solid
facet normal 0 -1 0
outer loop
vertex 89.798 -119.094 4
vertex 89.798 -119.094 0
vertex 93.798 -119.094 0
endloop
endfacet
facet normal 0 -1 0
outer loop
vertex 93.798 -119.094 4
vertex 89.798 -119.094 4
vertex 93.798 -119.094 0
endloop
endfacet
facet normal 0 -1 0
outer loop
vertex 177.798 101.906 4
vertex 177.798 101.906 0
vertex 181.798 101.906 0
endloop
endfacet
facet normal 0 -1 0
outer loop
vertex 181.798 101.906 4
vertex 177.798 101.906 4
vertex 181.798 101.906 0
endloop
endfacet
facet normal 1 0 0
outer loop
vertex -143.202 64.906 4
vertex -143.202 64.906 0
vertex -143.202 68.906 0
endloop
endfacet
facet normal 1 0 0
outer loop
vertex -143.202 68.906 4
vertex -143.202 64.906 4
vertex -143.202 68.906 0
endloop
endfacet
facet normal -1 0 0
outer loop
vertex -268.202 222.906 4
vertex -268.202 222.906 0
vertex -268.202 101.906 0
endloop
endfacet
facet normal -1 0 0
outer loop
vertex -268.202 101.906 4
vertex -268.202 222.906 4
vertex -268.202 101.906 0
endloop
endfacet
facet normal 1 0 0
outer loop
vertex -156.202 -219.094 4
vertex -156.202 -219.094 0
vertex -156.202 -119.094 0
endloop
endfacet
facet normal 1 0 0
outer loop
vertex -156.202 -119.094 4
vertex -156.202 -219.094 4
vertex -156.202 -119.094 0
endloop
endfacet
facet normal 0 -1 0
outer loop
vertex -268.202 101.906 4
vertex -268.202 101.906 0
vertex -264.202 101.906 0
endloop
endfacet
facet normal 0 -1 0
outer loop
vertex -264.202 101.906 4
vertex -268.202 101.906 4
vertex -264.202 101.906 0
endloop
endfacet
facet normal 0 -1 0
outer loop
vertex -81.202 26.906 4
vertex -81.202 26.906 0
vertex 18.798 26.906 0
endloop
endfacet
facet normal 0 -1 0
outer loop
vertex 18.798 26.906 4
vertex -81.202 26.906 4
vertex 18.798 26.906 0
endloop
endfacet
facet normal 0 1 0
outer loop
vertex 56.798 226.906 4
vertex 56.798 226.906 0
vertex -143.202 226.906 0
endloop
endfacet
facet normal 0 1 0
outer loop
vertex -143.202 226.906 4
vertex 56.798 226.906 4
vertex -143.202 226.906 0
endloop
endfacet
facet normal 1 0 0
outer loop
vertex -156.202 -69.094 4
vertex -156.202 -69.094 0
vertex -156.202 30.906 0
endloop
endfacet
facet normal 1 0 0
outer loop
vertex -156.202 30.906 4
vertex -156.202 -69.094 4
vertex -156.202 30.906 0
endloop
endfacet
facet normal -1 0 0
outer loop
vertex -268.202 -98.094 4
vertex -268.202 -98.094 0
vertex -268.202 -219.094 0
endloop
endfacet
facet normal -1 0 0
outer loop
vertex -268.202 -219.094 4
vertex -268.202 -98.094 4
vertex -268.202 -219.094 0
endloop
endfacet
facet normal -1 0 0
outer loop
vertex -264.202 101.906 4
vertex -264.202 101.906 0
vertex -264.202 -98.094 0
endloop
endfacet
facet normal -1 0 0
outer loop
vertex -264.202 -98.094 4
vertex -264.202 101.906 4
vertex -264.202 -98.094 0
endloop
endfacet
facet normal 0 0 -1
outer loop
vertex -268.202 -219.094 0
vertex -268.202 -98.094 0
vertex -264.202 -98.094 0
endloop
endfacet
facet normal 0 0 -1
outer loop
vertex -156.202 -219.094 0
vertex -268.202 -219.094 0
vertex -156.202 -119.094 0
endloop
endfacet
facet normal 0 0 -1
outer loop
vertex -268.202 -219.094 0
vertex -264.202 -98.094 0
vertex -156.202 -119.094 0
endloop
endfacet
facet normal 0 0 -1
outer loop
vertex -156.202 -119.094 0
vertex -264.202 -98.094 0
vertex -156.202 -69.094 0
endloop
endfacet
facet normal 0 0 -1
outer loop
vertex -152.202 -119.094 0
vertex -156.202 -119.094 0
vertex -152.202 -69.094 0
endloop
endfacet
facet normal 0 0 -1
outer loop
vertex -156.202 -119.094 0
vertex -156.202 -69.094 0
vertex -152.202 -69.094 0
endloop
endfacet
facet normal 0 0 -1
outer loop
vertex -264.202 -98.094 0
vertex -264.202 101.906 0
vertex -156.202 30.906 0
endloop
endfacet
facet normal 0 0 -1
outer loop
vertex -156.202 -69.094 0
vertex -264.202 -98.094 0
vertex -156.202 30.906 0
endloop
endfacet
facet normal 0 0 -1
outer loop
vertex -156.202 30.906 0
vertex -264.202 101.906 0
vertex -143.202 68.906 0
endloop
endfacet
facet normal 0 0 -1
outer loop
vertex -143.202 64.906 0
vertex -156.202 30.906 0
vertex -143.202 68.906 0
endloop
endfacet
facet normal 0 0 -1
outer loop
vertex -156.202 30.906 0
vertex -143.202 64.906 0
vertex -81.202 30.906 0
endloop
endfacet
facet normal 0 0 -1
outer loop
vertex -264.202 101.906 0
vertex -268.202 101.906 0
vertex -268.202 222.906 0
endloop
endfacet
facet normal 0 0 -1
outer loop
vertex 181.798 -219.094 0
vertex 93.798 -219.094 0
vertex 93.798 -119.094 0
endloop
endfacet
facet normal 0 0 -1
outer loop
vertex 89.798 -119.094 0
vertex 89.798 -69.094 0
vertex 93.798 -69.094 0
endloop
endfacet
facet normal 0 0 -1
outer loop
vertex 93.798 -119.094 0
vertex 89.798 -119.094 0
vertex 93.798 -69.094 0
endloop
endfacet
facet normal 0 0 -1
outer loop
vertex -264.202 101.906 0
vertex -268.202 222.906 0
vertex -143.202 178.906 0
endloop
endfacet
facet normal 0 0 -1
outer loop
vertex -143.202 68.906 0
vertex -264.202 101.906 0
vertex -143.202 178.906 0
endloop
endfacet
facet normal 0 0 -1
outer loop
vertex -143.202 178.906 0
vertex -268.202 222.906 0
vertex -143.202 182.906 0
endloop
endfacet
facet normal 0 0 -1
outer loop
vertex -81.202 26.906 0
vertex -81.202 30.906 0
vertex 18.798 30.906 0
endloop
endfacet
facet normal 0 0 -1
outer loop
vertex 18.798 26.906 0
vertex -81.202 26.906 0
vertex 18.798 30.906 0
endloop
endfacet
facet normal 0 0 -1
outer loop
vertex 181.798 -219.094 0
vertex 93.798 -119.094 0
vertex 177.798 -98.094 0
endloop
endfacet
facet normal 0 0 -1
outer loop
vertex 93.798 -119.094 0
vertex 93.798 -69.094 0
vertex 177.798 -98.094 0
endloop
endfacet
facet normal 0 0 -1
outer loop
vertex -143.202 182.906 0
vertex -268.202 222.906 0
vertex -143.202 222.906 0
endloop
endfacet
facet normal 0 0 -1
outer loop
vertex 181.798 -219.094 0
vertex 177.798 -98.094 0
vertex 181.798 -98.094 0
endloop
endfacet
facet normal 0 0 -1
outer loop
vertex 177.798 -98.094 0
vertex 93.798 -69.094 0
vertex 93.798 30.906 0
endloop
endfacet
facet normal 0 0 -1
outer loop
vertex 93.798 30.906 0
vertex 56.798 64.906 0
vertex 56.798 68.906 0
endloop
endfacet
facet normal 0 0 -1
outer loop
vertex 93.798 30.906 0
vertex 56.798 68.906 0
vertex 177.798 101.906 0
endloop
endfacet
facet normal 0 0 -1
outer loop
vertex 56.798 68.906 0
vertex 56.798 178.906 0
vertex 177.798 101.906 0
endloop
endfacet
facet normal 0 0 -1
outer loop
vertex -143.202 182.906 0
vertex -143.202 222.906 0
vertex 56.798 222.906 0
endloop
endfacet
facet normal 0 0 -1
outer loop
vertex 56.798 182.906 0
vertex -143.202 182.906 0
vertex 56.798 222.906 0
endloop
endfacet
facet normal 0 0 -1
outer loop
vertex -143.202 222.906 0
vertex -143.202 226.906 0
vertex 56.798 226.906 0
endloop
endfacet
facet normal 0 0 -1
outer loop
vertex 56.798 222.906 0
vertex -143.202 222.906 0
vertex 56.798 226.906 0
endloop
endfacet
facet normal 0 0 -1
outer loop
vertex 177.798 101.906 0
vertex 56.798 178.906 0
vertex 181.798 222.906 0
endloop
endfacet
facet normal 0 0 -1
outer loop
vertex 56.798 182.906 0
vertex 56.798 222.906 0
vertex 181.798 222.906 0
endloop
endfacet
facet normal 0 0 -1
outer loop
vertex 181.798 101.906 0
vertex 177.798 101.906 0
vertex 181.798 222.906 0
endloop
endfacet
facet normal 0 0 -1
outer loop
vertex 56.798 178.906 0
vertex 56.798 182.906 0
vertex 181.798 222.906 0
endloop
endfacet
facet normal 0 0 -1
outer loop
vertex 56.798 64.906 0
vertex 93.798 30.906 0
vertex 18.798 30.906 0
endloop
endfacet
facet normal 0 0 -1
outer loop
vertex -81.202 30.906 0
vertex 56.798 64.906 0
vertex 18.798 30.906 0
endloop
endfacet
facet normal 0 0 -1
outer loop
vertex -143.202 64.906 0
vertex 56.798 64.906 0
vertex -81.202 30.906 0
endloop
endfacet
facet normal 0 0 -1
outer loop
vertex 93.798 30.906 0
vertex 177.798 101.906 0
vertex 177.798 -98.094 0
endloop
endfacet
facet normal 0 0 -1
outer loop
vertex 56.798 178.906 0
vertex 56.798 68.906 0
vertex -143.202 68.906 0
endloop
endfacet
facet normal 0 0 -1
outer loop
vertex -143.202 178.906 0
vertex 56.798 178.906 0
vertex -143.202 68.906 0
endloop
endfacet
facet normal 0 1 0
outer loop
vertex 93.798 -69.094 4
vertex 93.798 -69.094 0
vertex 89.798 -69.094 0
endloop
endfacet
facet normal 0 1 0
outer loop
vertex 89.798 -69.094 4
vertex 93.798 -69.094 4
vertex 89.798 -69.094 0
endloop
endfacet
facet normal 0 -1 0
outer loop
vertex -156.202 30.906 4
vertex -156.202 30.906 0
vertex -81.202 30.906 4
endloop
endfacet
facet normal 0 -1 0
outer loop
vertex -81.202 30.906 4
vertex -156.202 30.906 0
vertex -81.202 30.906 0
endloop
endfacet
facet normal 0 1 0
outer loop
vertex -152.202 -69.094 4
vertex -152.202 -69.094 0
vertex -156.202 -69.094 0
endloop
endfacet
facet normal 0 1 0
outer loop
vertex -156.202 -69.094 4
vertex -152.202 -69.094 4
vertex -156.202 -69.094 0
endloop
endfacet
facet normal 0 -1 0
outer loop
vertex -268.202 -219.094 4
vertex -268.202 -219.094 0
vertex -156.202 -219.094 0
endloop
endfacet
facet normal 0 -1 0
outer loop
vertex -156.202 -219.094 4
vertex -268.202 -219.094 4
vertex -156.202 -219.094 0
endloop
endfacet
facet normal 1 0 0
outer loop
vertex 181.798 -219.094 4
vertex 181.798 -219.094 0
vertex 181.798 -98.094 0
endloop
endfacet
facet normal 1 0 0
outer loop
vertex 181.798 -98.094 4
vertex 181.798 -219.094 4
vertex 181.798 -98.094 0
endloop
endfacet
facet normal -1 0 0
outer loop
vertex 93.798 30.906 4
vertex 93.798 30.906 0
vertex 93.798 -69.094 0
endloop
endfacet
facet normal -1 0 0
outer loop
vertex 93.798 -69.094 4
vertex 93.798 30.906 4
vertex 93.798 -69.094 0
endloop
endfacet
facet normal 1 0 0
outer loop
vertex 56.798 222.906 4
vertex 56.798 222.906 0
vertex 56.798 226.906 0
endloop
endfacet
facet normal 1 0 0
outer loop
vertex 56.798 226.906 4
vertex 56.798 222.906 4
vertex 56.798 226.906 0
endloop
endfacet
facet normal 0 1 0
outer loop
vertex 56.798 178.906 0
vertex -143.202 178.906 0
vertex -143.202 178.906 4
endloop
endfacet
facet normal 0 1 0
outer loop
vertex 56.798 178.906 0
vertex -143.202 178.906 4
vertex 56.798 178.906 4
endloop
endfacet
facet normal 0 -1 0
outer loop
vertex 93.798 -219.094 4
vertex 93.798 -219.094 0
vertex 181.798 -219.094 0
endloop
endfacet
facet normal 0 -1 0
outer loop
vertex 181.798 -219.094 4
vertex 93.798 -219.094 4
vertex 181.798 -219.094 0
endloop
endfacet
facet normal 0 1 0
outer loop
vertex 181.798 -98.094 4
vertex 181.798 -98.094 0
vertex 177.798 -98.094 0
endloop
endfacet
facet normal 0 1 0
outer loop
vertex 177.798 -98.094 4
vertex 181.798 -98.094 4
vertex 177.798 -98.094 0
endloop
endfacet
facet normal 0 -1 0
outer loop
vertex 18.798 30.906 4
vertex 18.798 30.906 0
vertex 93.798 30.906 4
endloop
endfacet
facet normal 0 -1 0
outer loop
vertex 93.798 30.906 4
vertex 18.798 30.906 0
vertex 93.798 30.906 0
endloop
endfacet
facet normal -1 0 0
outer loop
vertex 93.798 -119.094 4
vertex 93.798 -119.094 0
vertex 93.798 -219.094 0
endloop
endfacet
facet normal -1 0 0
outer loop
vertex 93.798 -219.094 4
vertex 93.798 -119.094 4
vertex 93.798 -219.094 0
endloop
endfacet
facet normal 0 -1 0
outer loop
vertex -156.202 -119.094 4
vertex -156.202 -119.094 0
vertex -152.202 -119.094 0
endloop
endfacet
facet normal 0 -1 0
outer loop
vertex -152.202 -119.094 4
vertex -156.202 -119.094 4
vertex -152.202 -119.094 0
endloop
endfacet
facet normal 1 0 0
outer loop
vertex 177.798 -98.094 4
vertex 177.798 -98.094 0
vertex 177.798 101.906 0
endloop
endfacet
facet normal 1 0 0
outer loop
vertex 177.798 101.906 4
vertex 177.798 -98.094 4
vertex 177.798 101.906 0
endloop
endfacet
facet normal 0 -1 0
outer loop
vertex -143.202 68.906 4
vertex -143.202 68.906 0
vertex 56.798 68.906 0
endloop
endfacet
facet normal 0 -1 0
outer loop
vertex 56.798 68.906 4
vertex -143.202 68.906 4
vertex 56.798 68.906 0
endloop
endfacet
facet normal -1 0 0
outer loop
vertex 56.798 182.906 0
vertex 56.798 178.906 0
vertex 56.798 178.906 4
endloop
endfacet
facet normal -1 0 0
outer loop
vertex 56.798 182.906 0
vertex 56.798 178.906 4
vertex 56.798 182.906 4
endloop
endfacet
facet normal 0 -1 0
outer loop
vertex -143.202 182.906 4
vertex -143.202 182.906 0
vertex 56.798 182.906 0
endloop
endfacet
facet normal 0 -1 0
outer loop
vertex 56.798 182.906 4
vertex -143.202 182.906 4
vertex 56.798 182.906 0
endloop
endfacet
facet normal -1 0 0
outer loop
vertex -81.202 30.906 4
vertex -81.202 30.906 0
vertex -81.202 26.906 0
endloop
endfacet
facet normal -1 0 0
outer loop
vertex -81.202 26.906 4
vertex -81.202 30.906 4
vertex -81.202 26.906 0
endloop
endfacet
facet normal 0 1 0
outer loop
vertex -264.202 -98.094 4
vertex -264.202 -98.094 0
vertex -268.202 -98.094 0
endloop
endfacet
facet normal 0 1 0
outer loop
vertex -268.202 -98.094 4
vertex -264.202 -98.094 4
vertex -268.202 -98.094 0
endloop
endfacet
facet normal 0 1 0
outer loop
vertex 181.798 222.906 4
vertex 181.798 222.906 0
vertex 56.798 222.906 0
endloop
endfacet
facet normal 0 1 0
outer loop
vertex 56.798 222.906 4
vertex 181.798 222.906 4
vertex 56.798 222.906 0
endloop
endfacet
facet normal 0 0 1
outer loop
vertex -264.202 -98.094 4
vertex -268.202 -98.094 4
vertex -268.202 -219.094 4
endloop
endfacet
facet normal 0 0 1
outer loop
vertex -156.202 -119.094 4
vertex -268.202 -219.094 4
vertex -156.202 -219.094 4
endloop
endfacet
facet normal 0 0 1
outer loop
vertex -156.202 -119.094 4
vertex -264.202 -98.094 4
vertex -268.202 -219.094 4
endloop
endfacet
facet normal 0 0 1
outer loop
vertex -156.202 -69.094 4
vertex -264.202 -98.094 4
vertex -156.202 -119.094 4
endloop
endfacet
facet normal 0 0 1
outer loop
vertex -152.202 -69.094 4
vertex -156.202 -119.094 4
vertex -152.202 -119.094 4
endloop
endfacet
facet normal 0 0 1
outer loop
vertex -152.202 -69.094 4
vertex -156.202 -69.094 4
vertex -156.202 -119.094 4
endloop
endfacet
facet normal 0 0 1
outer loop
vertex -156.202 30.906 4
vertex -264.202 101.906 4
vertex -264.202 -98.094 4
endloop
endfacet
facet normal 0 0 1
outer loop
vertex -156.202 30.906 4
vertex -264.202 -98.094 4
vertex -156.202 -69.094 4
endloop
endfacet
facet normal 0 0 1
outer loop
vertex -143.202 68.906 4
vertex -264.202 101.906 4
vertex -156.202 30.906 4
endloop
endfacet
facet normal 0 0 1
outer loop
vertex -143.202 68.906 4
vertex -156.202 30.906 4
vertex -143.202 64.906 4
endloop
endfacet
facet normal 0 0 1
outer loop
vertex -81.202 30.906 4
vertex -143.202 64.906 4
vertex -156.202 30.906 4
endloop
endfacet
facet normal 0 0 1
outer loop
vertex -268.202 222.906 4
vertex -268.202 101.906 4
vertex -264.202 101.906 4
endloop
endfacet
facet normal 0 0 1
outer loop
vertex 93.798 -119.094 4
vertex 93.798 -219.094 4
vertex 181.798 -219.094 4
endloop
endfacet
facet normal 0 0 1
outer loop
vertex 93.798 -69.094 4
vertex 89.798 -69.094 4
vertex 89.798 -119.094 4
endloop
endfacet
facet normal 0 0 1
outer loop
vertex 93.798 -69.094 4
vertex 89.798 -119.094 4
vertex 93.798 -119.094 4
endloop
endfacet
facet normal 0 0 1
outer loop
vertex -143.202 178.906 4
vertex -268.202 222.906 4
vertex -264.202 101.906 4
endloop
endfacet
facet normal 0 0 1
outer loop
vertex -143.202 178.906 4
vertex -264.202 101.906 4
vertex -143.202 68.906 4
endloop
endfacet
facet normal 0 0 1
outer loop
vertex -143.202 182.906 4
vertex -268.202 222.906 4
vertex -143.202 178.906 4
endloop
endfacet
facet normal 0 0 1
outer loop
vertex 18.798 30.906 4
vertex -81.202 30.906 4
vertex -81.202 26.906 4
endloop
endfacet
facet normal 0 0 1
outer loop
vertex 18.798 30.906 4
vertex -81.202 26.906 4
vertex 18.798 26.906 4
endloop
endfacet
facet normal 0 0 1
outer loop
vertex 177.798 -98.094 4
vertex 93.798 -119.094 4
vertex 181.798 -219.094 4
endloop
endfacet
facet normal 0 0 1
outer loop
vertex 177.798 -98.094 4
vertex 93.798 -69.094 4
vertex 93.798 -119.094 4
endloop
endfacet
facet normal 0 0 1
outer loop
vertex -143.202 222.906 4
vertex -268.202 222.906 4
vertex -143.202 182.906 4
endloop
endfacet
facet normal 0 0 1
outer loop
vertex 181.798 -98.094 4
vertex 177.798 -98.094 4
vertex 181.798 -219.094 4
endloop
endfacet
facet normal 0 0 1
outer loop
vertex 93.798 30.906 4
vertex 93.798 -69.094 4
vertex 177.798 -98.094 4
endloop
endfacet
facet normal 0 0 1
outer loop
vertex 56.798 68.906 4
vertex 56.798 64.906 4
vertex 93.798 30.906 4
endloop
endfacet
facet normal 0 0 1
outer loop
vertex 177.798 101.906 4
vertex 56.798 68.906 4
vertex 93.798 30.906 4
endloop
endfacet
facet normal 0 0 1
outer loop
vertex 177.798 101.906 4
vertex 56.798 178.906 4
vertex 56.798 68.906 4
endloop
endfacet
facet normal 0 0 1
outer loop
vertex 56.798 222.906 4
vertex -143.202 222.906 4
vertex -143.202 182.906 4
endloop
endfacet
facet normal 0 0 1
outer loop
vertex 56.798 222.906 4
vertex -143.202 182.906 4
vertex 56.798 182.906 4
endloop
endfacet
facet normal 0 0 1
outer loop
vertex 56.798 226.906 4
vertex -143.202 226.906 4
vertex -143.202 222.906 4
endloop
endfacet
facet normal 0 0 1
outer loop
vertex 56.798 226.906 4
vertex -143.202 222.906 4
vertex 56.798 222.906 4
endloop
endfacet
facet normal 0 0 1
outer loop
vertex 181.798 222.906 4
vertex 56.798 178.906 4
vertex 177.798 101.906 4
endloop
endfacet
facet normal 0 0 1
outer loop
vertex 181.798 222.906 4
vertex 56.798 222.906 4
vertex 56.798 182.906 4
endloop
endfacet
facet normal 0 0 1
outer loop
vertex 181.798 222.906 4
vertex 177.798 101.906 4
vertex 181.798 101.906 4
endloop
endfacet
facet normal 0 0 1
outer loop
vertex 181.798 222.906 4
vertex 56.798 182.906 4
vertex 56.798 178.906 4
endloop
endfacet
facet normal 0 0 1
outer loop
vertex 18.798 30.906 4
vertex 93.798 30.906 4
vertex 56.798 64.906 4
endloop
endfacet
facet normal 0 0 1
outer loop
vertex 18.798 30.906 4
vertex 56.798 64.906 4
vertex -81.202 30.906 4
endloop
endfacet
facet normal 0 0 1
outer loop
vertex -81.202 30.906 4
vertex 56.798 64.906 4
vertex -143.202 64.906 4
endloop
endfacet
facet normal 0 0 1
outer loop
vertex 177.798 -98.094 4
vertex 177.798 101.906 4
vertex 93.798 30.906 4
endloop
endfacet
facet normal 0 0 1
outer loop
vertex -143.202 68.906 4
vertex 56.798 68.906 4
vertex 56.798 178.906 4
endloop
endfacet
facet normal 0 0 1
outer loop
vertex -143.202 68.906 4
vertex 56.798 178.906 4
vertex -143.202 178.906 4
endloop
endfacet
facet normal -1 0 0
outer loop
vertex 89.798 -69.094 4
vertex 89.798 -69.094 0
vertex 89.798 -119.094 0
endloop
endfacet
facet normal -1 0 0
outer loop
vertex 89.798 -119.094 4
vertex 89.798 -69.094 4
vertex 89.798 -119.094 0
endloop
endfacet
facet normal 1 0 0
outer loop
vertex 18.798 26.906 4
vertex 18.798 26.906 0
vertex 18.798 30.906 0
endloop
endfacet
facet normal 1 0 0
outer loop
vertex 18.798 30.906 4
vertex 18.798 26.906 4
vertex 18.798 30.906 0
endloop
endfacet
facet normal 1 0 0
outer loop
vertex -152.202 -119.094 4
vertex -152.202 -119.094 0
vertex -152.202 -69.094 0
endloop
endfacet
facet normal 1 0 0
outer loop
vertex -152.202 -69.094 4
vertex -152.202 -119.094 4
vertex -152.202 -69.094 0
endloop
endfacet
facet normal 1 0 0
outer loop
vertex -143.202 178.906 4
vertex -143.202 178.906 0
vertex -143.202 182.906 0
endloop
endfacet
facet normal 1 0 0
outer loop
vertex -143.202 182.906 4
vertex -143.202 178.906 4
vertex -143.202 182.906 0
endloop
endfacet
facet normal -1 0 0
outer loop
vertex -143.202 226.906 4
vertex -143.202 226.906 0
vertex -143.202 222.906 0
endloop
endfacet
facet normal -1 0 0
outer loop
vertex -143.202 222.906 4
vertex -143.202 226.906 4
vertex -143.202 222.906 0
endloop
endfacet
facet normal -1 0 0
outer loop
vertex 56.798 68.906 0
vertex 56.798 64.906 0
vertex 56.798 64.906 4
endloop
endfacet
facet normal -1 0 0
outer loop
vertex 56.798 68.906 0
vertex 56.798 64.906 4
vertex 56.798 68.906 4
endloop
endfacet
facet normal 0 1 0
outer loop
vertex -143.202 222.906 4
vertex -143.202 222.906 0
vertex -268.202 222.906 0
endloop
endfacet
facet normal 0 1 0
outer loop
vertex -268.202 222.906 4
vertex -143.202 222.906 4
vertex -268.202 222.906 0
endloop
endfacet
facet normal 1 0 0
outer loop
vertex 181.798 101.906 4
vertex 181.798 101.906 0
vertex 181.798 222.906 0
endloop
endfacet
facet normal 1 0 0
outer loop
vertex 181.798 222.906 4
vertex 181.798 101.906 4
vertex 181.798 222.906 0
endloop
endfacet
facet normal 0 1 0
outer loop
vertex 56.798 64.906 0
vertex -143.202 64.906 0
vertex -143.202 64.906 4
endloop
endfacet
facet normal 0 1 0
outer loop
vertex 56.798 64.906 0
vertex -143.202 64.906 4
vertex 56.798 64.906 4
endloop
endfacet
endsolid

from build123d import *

# Parameters (mm, degrees)
SKETCH1_W           = 200
SKETCH1_H           = 4
BOSS_EXTRUDE1_DEPTH = 4


with BuildPart() as part:
    # Sketch1 → Boss-Extrude1 (new body)
    with BuildSketch(Plane.XY):
        Polygon((-268.2019237, -98.094032778), (-268.2019237, -219.094032778), (-156.2019237, -219.094032778), (-156.2019237, -119.094032778), (-152.2019237, -119.094032778), (-152.2019237, -69.094032778), (-156.2019237, -69.094032778), (-156.2019237, 30.905967222), (-81.2019237, 30.905967222), (-81.2019237, 26.905967222), (18.7980763, 26.905967222), (18.7980763, 30.905967222), (93.7980763, 30.905967222), (93.7980763, -69.094032778), (89.7980763, -69.094032778), (89.7980763, -119.094032778), (93.7980763, -119.094032778), (93.7980763, -219.094032778), (181.7980763, -219.094032778), (181.7980763, -98.094032778), (177.7980763, -98.094032778), (177.7980763, 101.905967222), (181.7980763, 101.905967222), (181.7980763, 222.905967222), (56.7980763, 222.905967222), (56.7980763, 226.905967222), (-143.2019237, 226.905967222), (-143.2019237, 222.905967222), (-268.2019237, 222.905967222), (-268.2019237, 101.905967222), (-264.2019237, 101.905967222), (-264.2019237, -98.094032778), align=None)
        with Locations((-43.2019237, 66.905967222)):
            Rectangle(SKETCH1_W, SKETCH1_H, mode=Mode.SUBTRACT)
        with Locations((-43.2019237, 180.905967222)):
            Rectangle(SKETCH1_W, SKETCH1_H, mode=Mode.SUBTRACT)
    extrude(amount=BOSS_EXTRUDE1_DEPTH)


solid = part.part
